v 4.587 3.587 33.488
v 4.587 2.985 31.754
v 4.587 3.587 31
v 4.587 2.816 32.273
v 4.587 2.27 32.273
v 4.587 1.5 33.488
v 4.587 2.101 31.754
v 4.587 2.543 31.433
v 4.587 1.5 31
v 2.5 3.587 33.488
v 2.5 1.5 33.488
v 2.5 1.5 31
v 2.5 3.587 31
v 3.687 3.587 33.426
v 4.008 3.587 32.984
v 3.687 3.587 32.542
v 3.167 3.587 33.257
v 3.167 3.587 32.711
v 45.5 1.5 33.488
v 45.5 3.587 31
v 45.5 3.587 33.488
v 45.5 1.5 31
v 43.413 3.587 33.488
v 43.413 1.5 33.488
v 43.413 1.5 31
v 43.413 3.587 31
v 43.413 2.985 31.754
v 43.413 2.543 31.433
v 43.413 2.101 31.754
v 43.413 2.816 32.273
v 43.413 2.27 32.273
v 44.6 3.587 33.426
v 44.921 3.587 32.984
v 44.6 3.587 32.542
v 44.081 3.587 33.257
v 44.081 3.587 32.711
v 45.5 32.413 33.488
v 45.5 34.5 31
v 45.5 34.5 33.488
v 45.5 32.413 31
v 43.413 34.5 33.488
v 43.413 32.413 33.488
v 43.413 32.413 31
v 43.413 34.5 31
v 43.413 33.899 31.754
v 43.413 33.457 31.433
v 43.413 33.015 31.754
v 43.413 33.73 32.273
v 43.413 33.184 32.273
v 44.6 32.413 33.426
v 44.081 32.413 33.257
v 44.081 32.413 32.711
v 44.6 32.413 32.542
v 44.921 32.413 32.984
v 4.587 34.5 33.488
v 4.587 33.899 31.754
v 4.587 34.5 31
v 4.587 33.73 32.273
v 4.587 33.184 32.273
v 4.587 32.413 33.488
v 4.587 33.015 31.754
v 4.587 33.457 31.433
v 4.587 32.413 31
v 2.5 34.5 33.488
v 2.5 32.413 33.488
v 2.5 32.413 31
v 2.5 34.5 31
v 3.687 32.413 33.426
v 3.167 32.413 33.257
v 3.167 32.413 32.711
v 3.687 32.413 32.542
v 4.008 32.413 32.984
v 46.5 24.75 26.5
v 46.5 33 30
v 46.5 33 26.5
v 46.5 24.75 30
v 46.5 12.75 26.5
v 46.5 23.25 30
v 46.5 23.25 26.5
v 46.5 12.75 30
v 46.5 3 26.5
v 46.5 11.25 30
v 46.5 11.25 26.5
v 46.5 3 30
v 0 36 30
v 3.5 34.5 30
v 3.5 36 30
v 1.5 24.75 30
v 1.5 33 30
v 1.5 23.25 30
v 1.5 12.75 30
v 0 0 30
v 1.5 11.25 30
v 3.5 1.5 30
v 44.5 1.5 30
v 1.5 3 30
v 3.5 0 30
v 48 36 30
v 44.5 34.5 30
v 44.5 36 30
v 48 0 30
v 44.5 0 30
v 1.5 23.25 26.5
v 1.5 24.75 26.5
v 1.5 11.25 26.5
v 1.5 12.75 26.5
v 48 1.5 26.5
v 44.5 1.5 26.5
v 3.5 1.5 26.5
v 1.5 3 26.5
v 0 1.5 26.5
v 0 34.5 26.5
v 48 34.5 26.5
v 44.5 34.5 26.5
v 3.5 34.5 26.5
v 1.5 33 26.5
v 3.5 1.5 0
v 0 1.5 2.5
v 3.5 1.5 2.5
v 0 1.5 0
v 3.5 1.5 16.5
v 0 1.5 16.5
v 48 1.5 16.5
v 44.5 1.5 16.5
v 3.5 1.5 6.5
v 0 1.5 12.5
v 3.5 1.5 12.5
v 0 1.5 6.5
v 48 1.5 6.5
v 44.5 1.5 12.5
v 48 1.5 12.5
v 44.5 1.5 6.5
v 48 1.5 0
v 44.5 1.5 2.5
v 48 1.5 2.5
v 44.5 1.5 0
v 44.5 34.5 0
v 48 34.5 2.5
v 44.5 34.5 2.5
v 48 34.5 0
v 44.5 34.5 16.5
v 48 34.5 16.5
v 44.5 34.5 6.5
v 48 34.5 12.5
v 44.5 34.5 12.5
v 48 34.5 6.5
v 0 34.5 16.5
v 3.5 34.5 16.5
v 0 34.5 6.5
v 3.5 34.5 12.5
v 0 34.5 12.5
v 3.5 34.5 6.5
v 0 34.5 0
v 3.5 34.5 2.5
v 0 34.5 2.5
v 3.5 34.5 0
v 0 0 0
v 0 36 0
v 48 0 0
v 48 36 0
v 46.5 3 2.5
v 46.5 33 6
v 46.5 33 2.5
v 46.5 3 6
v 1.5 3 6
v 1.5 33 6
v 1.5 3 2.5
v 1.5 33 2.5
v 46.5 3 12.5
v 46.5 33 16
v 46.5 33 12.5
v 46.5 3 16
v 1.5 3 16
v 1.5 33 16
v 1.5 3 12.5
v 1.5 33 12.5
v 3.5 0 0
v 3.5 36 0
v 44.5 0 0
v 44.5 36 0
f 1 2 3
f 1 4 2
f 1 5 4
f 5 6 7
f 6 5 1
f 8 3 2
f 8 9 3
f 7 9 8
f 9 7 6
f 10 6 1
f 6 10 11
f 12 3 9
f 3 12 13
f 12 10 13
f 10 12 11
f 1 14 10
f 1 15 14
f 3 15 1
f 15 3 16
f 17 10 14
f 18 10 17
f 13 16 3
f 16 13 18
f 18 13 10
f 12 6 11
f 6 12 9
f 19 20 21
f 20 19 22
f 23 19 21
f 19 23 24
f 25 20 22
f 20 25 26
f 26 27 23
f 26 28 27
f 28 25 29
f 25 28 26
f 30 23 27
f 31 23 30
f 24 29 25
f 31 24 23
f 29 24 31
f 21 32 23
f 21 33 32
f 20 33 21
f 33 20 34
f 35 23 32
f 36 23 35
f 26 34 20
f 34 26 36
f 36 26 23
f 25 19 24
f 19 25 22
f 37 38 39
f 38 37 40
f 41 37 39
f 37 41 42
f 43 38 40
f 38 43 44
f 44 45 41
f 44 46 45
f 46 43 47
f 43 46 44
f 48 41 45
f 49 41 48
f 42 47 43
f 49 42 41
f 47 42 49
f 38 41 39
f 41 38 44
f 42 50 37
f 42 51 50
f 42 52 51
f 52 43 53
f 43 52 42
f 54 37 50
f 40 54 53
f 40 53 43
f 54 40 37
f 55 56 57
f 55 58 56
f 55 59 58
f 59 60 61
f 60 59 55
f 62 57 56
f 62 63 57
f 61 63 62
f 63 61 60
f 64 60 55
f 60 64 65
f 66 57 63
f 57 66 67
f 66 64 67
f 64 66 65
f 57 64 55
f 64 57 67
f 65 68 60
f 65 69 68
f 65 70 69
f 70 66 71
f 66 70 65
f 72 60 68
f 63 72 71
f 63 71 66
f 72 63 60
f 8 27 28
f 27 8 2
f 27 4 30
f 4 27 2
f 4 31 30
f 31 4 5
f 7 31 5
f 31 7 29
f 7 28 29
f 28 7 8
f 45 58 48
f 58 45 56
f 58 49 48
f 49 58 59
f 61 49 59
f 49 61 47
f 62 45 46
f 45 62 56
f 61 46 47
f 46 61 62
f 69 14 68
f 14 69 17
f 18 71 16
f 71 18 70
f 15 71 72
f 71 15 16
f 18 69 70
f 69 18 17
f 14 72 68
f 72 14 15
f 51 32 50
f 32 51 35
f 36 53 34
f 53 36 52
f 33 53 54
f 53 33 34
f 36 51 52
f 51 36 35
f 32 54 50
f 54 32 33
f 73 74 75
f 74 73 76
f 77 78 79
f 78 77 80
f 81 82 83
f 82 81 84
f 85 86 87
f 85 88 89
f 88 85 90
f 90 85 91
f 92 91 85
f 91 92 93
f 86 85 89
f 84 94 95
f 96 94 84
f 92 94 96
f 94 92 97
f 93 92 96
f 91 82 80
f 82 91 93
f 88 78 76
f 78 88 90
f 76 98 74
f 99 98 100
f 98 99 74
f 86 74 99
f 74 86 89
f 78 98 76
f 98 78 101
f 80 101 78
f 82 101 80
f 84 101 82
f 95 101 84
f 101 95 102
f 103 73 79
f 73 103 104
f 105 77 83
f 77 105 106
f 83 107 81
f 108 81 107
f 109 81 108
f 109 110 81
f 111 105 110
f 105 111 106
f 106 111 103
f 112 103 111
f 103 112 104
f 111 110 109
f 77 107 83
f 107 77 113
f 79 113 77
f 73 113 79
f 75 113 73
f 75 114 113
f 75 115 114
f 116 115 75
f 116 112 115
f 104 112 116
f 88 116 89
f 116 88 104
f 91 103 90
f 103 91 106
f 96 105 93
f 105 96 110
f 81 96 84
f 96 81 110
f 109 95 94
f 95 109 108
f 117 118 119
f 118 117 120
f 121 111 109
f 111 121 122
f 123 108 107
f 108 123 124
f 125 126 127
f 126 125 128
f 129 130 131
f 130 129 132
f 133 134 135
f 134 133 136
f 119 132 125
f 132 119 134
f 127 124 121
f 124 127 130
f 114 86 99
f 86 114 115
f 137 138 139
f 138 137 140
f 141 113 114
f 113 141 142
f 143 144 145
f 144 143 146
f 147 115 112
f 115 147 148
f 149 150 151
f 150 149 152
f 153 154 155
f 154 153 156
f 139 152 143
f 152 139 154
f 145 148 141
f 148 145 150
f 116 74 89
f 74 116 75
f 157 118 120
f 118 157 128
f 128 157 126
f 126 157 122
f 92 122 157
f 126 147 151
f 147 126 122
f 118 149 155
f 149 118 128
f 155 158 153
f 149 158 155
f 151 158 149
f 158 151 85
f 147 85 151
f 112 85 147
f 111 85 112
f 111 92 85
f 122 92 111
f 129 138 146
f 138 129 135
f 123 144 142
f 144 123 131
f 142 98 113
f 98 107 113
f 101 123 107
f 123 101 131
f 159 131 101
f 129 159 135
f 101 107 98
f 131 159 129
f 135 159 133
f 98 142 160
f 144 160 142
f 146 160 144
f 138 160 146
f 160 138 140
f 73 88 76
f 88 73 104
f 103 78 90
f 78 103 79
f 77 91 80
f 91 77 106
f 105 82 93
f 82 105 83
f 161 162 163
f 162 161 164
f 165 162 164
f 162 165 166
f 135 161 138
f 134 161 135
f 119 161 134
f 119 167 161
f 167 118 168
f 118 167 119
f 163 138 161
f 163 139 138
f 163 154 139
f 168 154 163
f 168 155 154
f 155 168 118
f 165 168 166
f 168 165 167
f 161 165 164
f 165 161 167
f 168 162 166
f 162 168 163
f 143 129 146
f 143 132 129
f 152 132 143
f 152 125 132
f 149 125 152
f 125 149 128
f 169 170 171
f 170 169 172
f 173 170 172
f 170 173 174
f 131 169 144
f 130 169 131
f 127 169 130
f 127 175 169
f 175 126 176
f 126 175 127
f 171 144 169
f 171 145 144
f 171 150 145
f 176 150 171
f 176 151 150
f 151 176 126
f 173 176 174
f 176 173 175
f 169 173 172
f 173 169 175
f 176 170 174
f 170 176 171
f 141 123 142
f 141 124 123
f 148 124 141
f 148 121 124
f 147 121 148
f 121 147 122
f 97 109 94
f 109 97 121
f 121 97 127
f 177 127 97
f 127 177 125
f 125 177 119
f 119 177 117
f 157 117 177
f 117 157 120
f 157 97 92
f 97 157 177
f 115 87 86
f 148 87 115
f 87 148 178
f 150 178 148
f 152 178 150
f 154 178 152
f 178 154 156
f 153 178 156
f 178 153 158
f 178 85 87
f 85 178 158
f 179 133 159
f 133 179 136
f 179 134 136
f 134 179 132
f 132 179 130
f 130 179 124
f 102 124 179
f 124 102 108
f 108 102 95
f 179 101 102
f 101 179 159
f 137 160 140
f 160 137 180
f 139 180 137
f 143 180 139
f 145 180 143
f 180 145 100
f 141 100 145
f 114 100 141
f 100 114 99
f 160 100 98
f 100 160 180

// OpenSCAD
//Downloaded from https://www.thingiverse.com/thing:1468511
//Draw Allted's Simple CNC Table based on input dimensions using openscad
//Translated into openscad on 4/4/2016  by: David Bunch
//
//The default dimensions are what I am using for a table, 48"Long x 36"Wide x 30"High
//This is drawn in Inches, set ScaleFactor variable to 25.4 to draw in millimeters
//Rev2 - revised for Quantity of Top Ledge Lengths if only 1 middle stiffener used
//Rev3 - Legs, Top Ledges & Shelf Ledges can be different Widths & thickness now
//       I made this change because I want to use 2x3's for the Shelf ledges
//Rev4 - Display Shelf Usable Heights with a visual cube for each shelf
//CUSTOMIZER VARIABLES
//If you want your MPCNC corners to be right at corners of table,
//Set Len & Wid the same as your CNC_LEN & CNC_Wid
Len = 48;                   //Length of Table
Wid = 36;                   //Width of Table
Ht = 30;                    //Height of Table at top of Ledges
LegWd24_Wid = 3.5;          //Width Legs (I am using 2x4)
LegWd24_Thk = 1.5;          //Thickness of 2Legs

TopLedgeWd24_Wid = 3.5;     //Width of Top Ledge Boards (2x4 is what I use)
TopLedgeWd24_Thk = 1.5;     //Thickness of Top Ledge Boards
MidTopLedgeQty = 2;         //How many middle stiffener ledges, 1 or 2

EdgeWd_Wid = 6;             //How wide of top to put along edges
EdgeWd_Thk = 1;             //How thick the top is

Shelf_Qty = 2;              //0,1 or 2
Shelf1_Ht = 6;              //Shelf height of lower shelf
Shelf2_Ht = 16;             //Shelf height of upper shelf
ShelfThk = 0.5;             //Thickness of Shelves
ShelfLedgeWd24_Wid = 3.5;   //Width of Shelf Ledge Boards (Default is 2x4)
ShelfLedgeWd24_Thk = 1.5;   //Thickness of Shelf Ledge Boards
                        //I am going to use 2x3 to give me a little extra shelf height
Shelf_Cube_X = 12;  //Visual Show Shelf Cube this size in X
Shelf_Cube_Y = 12;  //Visual Show Shelf Cube this size in Y
CNC_Len = 43;       //Length of Physical MPCNC (subtract 11 for work Length)
                    //Length is the Y-Axis on my machine
CNC_Wid = 33;       //Width of Physical MPCNC (subtract 11 for work Width)
                    //Width is the X-Axis on my machine
EMT_OD = 23.6 / 25.4;       //Diameter of EMT, convert to Inches
ScaleFactor = 1;    //1 = draw in Inches, set to 25.4 to draw in millimeters
//CUSTOMIZER VARIABLES END

//Calculate Usable Shelf Space Heights
ToeSpace = Shelf1_Ht - ShelfLedgeWd24_Wid;  //Space Below Bottom Shelf Ledge
OneShelfSpace = Ht - TopLedgeWd24_Wid - (Shelf1_Ht + ShelfThk);
BotShelfSpace = Shelf2_Ht - ShelfLedgeWd24_Wid - (Shelf1_Ht + ShelfThk);
TopShelfSpace = Ht - TopLedgeWd24_Wid - (Shelf2_Ht + ShelfThk);

//Your actual work area will probably be less depending on
//what size router you are using & how wide your tool holder is
CNC_WorkLen = CNC_Len - 11;         //Work area Length of MPCNC router
CNC_WorkWid = CNC_Wid - 11;         //Work area Width of MPCNC router
Work_Y_Loc = (Len - CNC_WorkLen)/2; //X & Y locations of work area in this drawing
Work_X_Loc = (Wid - CNC_WorkWid)/2;

TopMidWid = Wid-(EdgeWd_Wid*2);
CNC_Corner_Wid = 53.0 / 25.4;
CNC_Corner_Ht = 63.2 / 25.4;

Len2 = Len / 2;
Wid2 = Wid / 2;
CNC_Len2 = CNC_Len / 2;
CNC_Wid2 = CNC_Wid / 2;
CNC_Corner_Wid2 = CNC_Corner_Wid / 2;

WdTopLedgeLen = Len - (TopLedgeWd24_Thk * 2);
WdTopLedgeWid = Wid - (TopLedgeWd24_Thk * 2);

WdShelfLedgeLen = Len - (ShelfLedgeWd24_Thk * 2);
WdShelfLedgeWid = Wid - (ShelfLedgeWd24_Thk * 2);
ShelfWid = Wid - (LegWd24_Thk * 2);    //Width of each of the 1 or 2 shelf tops

MPCNC_X_Loc = Len2-CNC_Len2;    //MPCNC router X location from Lower Left corner
MPCNC_Y_Loc = Wid2-CNC_Wid2;    //MPCNC router Y location from Lower Left corner
PipeY_Z_Loc = 22.8 / 25.4;  //EMT Y Axis Z Height Location from base of Corner block
PipeX_Z_Loc = 50.4 / 25.4;  //EMT X Axis Z Height Location from base of Corner block

//Output Cut Data
if (ScaleFactor == 1)
{
    Header = "*******************************";
    Spacer = "----------------------------------------------";
    c = str("** Cut 4 Legs ",Ht,"\" Long");
    d1 = str("** Cut 3 Top Ledge Lengths ",WdTopLedgeLen,"\" Long");
    d2 = str("** Cut 4 Top Ledge Lengths ",WdTopLedgeLen,"\" Long");
    e = str("** Cut 2 Top Ledge Widths ",WdTopLedgeWid,"\" Long");
    FTS = str("** Cut 2 Top Edges ",Len,"\" x ",EdgeWd_Wid,"\" Wide");
    FTM = str("** Cut 1 Top Middle ",Len,"\" x ",TopMidWid,"\" Wide");
    FL1 = str("** Cut 2 Shelf Ledge Lengths ",WdTopLedgeLen,"\" Long");
    FW1 = str("** Cut 2 Shelf Ledge Widths ",WdTopLedgeWid,"\" Long");
    FS1 = str("** Cut 1 shelves ",Len,"\" x ",ShelfWid,"\" Wide");
    //ShelfWid
    FL2 = str("** Cut 4 Shelf Ledge Lengths ",WdTopLedgeLen,"\" Long");
    FW2 = str("** Cut 4 Shelf Ledge Widths ",WdTopLedgeWid,"\" Long");
    FS2 = str("** Cut 2 shelves ",Len,"\" x ",ShelfWid,"\" Wide");
    F_ToeSpace = str("** Toe Space Height = ",ToeSpace, chr(34));
    F_UseSpace = str("** Single Shelf Usable Height = ",OneShelfSpace, chr(34));
    F_UseSpace1 = str("** Bottom Shelf Usable Height = ",BotShelfSpace, "\"");
    F_UseSpace2 = str("** Top Shelf Usable Height = ",TopShelfSpace, "\"");   
    echo(Header);
    echo(c);
    if (MidTopLedgeQty == 1)
    {
        echo(d1);
    } else if (MidTopLedgeQty == 2)
    {
        echo(d2);
    }
    echo(e);
    echo(FTS);
    echo(FTM);
    echo(Spacer);
    if (Shelf_Qty == 1)
    {
        echo(FL1);
        echo(FW1);
        echo(FS1);
        echo(Spacer);
        echo(F_ToeSpace);
        echo(F_UseSpace);
//Draw Cube to Represent Toe Space"
        translate([0,LegWd24_Thk,0])
        %cube([Shelf_Cube_X,Shelf_Cube_Y,ToeSpace]);
//Draw Cube to Represent Bottom Shelf Height"
        color("red",.7)
        translate([0,0,Shelf1_Ht + ShelfThk])
        %cube([Shelf_Cube_X,Shelf_Cube_Y,OneShelfSpace]);

    } else if (Shelf_Qty == 2)
    {
        echo(FL2);
        echo(FW2);
        echo(FS2);
        echo(Spacer);
        echo(F_ToeSpace);
        echo(F_UseSpace1);
        echo(F_UseSpace2);
//Draw Cube to Represent Toe Space"
        translate([0,LegWd24_Thk,0])
        %cube([Shelf_Cube_X,Shelf_Cube_Y,ToeSpace]);
//Draw Cube to Represent Bottom Shelf Height"
        color("red",.7)
        translate([0,LegWd24_Thk,Shelf1_Ht + ShelfThk])
        %cube([Shelf_Cube_X,Shelf_Cube_Y,BotShelfSpace]);
//Draw Cube to Represent Top Shelf Height"
        color("blue",.7)
        translate([0,LegWd24_Thk,Shelf2_Ht + ShelfThk])
        %cube([Shelf_Cube_X,Shelf_Cube_Y,TopShelfSpace]);
    }
    echo(Header);
} else if (ScaleFactor == 25.4)
{
    Header = "**********************************";
    Spacer = "----------------------------------------------------";
    c = str("** Cut 4 Legs ",Ht*25.4,"mm Long");
    d = str("** Cut 4 Top Ledge Lengths ",WdTopLedgeLen*25.4,"mm Long");
    e = str("** Cut 2 Top Ledge Widths ",WdTopLedgeWid*25.4,"mm Long");
    FTS = str("** Cut 2 Top Edges ",Len*25.4,"\" x ",EdgeWd_Wid*25.4,"\" Wide");
    FTM = str("** Cut 1 Top Middle ",Len*25.4,"\" x ",TopMidWid*25.4,"\" Wide");
    FL1 = str("** Cut 2 Shelf Ledge Lengths ",WdTopLedgeLen*25.4,"mm Long");
    FW1 = str("** Cut 2 Shelf Ledge Widths ",WdTopLedgeWid*25.4,"mm Long");
    FS1 = str("** Cut 1 shelves ",Len*25.4,"\" x ",ShelfWid*25.4,"mm Wide");
    //ShelfWid
    FL2 = str("** Cut 4 Shelf Ledge Lengths ",WdTopLedgeLen*25.4,"mm Long");
    FW2 = str("** Cut 4 Shelf Ledge Widths ",WdTopLedgeWid*25.4,"mm Long");
    FS2 = str("** Cut 2 shelves ",Len*25.4,"\" x ",ShelfWid*25.4,"mm Wide");
    
    echo(Header);
    echo(c);
    echo(d);
    echo(e);
    echo(FTS);
    echo(FTM);
    echo(Spacer);
    if (Shelf_Qty == 1)
    {
        echo(FL1);
        echo(FW1);
        echo(FS1);
    } else if (Shelf_Qty == 2)
    {
        echo(FL2);
        echo(FW2);
        echo(FS2);
    }
    echo(Header);
}

module Leg()
{
    cube([LegWd24_Wid,LegWd24_Thk,Ht]);
}
module TopEdge()
{
    color("tan",.7)
    cube([Len,EdgeWd_Wid,EdgeWd_Thk]);  
}
module TopMiddle()
{
    color("Peru",.7)
    cube([Len,Wid-(EdgeWd_Wid*2),EdgeWd_Thk]);
}
module Shelf()
{
    color("Peru",.7)
    cube([Len,ShelfWid,ShelfThk]);
}
module CornerBlk()
{
    translate([MPCNC_X_Loc,MPCNC_Y_Loc,Ht+EdgeWd_Thk])
    color("blue")
    {
        translate([0,0,0])
        cube([CNC_Corner_Wid,CNC_Corner_Wid,CNC_Corner_Ht]);
        translate([CNC_Len-CNC_Corner_Wid,0,0])
        cube([CNC_Corner_Wid,CNC_Corner_Wid,CNC_Corner_Ht]);
        translate([CNC_Len-CNC_Corner_Wid,CNC_Wid - CNC_Corner_Wid,0])
        cube([CNC_Corner_Wid,CNC_Corner_Wid,CNC_Corner_Ht]);
        translate([0,CNC_Wid - CNC_Corner_Wid,0])
        cube([CNC_Corner_Wid,CNC_Corner_Wid,CNC_Corner_Ht]);
    }
}
module EMT()
{
    translate([MPCNC_X_Loc,MPCNC_Y_Loc,Ht+EdgeWd_Thk])
    color("silver")
    {
//Y Pipes
        translate([0,CNC_Corner_Wid2,PipeY_Z_Loc])
        rotate([0,90,0])
        cylinder(d=EMT_OD,h=CNC_Len);
        translate([0,CNC_Wid-CNC_Corner_Wid2,PipeY_Z_Loc])
        rotate([0,90,0])
        cylinder(d=EMT_OD,h=CNC_Len);
//X Pipes
        translate([CNC_Corner_Wid2,0,PipeX_Z_Loc])
        rotate([-90,0,0])
        cylinder(d=EMT_OD,h=CNC_Wid);
        translate([CNC_Len-CNC_Corner_Wid2,0,PipeX_Z_Loc])
        rotate([-90,0,0])
        cylinder(d=EMT_OD,h=CNC_Wid);
    }
}
module TopLedges()
{
//Draw The Long Length Ledges (Len)
    color("cyan")
    {
        translate([TopLedgeWd24_Thk,LegWd24_Thk,0])
        cube([WdTopLedgeLen,TopLedgeWd24_Thk,TopLedgeWd24_Wid]);
        translate([TopLedgeWd24_Thk,Wid-LegWd24_Thk-TopLedgeWd24_Thk,0])
        cube([WdTopLedgeLen,TopLedgeWd24_Thk,TopLedgeWd24_Wid]);
    }
//Draw the Short Length Ledges (Wid)
    color("green")
    {
        translate([0,LegWd24_Thk,0])
        cube([TopLedgeWd24_Thk,Wid-(LegWd24_Thk*2),TopLedgeWd24_Wid]);
        translate([Len-TopLedgeWd24_Thk,LegWd24_Thk,0])
        cube([TopLedgeWd24_Thk,Wid-(LegWd24_Thk*2),TopLedgeWd24_Wid]);
    }
}
module ShelfLedges()
{
//Draw The Long Length Ledges (Len)
    color("cyan")
    {
        translate([ShelfLedgeWd24_Thk,LegWd24_Thk,0])
        cube([WdShelfLedgeLen,ShelfLedgeWd24_Thk,ShelfLedgeWd24_Wid]);
        translate([ShelfLedgeWd24_Thk,Wid-LegWd24_Thk-ShelfLedgeWd24_Thk,0])
        cube([WdShelfLedgeLen,ShelfLedgeWd24_Thk,ShelfLedgeWd24_Wid]);
    }
//Draw the Short Length Ledges (Wid)
    color("green")
    {
        translate([0,LegWd24_Thk,0])
        cube([ShelfLedgeWd24_Thk,Wid-(LegWd24_Thk*2),ShelfLedgeWd24_Wid]);
        translate([Len-ShelfLedgeWd24_Thk,LegWd24_Thk,0])
        cube([ShelfLedgeWd24_Thk,Wid-(LegWd24_Thk*2),ShelfLedgeWd24_Wid]);
    }
}
scale([ScaleFactor,ScaleFactor,ScaleFactor])
{
    CornerBlk();        //Draw 4 corner blocks
    EMT();              //Draw the EMT
    translate([Work_Y_Loc,Work_X_Loc,Ht+EdgeWd_Thk])
    color("red",.5)
    %cube([CNC_WorkLen,CNC_WorkWid,.25]);   //Draw Work Area
//
    translate([0,0,Ht])
    %TopEdge();         //Draw the 1st Top Edge
    translate([0,Wid-EdgeWd_Wid,Ht])
    %TopEdge();         //Draw the 2nd Top Edge
    translate([0,EdgeWd_Wid,Ht])
    %TopMiddle();       //Draw the Top Middle
    Leg();              //Draw 1st Leg
    translate([0,Wid-LegWd24_Thk,0])
    Leg();              //Draw 2nd Leg
    translate([Len-LegWd24_Wid,0,0])
    Leg();              //Draw 3rd Leg
    translate([Len-LegWd24_Wid,Wid-LegWd24_Thk,0])
    Leg();              //Draw 4th Leg
    translate([0,0,Ht-TopLedgeWd24_Wid])
    TopLedges();           //Draw the 4 top outside ledges that top rests on
    if (MidTopLedgeQty == 1)
    {
        translate([TopLedgeWd24_Thk,Wid/2-(LegWd24_Thk/2) ,Ht-TopLedgeWd24_Wid])
        cube([WdTopLedgeLen,TopLedgeWd24_Thk,TopLedgeWd24_Wid]);
    } else
    {
        translate([TopLedgeWd24_Thk,(Wid/2-(LegWd24_Thk/2))+6,Ht-TopLedgeWd24_Wid])
        cube([WdTopLedgeLen,TopLedgeWd24_Thk,TopLedgeWd24_Wid]);
        translate([TopLedgeWd24_Thk,(Wid/2-(LegWd24_Thk/2))-6,Ht-TopLedgeWd24_Wid])
        cube([WdTopLedgeLen,TopLedgeWd24_Thk,TopLedgeWd24_Wid]);
    }
    if (Shelf_Qty > 0)
    {
        translate([0,0,Shelf1_Ht-ShelfLedgeWd24_Wid])
        ShelfLedges();
        translate([0,LegWd24_Thk,Shelf1_Ht])
        Shelf();
    }
    if (Shelf_Qty > 1)
    {
        translate([0,0,Shelf2_Ht-ShelfLedgeWd24_Wid])
        ShelfLedges();
        translate([0,LegWd24_Thk,Shelf2_Ht])
        Shelf();
    }
}
